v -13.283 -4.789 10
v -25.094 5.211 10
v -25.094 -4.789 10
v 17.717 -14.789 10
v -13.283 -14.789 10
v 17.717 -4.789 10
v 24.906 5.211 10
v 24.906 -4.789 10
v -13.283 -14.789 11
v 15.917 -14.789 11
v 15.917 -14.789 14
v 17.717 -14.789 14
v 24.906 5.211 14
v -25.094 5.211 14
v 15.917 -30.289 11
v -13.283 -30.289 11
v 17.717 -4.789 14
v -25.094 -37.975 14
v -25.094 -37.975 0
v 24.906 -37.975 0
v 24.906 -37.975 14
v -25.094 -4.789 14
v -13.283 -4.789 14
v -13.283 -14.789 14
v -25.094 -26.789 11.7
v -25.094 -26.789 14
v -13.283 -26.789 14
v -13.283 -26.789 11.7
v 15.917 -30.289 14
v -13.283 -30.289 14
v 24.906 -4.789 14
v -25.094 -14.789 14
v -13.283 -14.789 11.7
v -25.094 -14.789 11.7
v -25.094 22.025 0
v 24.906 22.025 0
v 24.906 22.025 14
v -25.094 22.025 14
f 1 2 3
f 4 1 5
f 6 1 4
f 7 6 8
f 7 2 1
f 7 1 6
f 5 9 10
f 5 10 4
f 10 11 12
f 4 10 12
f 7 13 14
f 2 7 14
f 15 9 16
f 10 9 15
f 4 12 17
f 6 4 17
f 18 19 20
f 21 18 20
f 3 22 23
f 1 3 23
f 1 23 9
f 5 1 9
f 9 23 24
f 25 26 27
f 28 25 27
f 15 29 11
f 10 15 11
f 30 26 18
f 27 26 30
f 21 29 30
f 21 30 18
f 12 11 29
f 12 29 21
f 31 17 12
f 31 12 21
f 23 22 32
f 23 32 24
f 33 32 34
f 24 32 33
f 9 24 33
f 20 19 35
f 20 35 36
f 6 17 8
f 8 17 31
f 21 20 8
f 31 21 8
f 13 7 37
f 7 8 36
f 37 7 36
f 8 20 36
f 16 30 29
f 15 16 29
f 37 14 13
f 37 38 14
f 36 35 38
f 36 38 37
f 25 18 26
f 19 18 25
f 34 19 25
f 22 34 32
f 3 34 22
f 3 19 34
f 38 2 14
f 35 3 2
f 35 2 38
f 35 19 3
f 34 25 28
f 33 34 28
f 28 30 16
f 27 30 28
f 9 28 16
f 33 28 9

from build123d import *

# Parameters (mm, degrees)
F0_W     = 50
F0_H     = 60
F1_DEPTH = 14
F2_W     = 29.2
F2_H     = 15.5
F3_DEPTH = 3
F4_W     = 11.810996
F4_H     = 12
F5_DEPTH = 2.3
F7_DEPTH = 4


with BuildPart() as f1:
    # F0 (on Top) → F1 (new body)
    with BuildSketch(Plane.XY):
        with Locations((-0.093784, -7.974683)):
            Rectangle(F0_W, F0_H)
    extrude(amount=F1_DEPTH)

    # F2 (on face) → F3 (cut)
    with BuildSketch(Plane.XY.offset(14)):
        with Locations((1.317212, -22.539393)):
            Rectangle(F2_W, F2_H)
    extrude(amount=-F3_DEPTH, mode=Mode.SUBTRACT)

    # F4 (on face) → F5 (cut)
    with BuildSketch(Plane.XY.offset(14)):
        with Locations((-19.188286, -20.789393)):
            Rectangle(F4_W, F4_H)
    extrude(amount=-F5_DEPTH, mode=Mode.SUBTRACT)

    # F6 (on face) → F7 (cut)
    with BuildSketch(Plane.XY.offset(14)):
        Polygon((-13.282784, -4.789393), (-13.282784, -14.789393), (15.917212, -14.789393), (17.717216, -14.789393), (17.717216, -4.789393), (24.906216, -4.789393), (24.906216, 5.210607), (17.717216, 5.210607), (-13.282784, 5.210607), (-25.093784, 5.210607), (-25.093784, -4.789393), align=None)
    extrude(amount=-F7_DEPTH, mode=Mode.SUBTRACT)


solid = f1.part
